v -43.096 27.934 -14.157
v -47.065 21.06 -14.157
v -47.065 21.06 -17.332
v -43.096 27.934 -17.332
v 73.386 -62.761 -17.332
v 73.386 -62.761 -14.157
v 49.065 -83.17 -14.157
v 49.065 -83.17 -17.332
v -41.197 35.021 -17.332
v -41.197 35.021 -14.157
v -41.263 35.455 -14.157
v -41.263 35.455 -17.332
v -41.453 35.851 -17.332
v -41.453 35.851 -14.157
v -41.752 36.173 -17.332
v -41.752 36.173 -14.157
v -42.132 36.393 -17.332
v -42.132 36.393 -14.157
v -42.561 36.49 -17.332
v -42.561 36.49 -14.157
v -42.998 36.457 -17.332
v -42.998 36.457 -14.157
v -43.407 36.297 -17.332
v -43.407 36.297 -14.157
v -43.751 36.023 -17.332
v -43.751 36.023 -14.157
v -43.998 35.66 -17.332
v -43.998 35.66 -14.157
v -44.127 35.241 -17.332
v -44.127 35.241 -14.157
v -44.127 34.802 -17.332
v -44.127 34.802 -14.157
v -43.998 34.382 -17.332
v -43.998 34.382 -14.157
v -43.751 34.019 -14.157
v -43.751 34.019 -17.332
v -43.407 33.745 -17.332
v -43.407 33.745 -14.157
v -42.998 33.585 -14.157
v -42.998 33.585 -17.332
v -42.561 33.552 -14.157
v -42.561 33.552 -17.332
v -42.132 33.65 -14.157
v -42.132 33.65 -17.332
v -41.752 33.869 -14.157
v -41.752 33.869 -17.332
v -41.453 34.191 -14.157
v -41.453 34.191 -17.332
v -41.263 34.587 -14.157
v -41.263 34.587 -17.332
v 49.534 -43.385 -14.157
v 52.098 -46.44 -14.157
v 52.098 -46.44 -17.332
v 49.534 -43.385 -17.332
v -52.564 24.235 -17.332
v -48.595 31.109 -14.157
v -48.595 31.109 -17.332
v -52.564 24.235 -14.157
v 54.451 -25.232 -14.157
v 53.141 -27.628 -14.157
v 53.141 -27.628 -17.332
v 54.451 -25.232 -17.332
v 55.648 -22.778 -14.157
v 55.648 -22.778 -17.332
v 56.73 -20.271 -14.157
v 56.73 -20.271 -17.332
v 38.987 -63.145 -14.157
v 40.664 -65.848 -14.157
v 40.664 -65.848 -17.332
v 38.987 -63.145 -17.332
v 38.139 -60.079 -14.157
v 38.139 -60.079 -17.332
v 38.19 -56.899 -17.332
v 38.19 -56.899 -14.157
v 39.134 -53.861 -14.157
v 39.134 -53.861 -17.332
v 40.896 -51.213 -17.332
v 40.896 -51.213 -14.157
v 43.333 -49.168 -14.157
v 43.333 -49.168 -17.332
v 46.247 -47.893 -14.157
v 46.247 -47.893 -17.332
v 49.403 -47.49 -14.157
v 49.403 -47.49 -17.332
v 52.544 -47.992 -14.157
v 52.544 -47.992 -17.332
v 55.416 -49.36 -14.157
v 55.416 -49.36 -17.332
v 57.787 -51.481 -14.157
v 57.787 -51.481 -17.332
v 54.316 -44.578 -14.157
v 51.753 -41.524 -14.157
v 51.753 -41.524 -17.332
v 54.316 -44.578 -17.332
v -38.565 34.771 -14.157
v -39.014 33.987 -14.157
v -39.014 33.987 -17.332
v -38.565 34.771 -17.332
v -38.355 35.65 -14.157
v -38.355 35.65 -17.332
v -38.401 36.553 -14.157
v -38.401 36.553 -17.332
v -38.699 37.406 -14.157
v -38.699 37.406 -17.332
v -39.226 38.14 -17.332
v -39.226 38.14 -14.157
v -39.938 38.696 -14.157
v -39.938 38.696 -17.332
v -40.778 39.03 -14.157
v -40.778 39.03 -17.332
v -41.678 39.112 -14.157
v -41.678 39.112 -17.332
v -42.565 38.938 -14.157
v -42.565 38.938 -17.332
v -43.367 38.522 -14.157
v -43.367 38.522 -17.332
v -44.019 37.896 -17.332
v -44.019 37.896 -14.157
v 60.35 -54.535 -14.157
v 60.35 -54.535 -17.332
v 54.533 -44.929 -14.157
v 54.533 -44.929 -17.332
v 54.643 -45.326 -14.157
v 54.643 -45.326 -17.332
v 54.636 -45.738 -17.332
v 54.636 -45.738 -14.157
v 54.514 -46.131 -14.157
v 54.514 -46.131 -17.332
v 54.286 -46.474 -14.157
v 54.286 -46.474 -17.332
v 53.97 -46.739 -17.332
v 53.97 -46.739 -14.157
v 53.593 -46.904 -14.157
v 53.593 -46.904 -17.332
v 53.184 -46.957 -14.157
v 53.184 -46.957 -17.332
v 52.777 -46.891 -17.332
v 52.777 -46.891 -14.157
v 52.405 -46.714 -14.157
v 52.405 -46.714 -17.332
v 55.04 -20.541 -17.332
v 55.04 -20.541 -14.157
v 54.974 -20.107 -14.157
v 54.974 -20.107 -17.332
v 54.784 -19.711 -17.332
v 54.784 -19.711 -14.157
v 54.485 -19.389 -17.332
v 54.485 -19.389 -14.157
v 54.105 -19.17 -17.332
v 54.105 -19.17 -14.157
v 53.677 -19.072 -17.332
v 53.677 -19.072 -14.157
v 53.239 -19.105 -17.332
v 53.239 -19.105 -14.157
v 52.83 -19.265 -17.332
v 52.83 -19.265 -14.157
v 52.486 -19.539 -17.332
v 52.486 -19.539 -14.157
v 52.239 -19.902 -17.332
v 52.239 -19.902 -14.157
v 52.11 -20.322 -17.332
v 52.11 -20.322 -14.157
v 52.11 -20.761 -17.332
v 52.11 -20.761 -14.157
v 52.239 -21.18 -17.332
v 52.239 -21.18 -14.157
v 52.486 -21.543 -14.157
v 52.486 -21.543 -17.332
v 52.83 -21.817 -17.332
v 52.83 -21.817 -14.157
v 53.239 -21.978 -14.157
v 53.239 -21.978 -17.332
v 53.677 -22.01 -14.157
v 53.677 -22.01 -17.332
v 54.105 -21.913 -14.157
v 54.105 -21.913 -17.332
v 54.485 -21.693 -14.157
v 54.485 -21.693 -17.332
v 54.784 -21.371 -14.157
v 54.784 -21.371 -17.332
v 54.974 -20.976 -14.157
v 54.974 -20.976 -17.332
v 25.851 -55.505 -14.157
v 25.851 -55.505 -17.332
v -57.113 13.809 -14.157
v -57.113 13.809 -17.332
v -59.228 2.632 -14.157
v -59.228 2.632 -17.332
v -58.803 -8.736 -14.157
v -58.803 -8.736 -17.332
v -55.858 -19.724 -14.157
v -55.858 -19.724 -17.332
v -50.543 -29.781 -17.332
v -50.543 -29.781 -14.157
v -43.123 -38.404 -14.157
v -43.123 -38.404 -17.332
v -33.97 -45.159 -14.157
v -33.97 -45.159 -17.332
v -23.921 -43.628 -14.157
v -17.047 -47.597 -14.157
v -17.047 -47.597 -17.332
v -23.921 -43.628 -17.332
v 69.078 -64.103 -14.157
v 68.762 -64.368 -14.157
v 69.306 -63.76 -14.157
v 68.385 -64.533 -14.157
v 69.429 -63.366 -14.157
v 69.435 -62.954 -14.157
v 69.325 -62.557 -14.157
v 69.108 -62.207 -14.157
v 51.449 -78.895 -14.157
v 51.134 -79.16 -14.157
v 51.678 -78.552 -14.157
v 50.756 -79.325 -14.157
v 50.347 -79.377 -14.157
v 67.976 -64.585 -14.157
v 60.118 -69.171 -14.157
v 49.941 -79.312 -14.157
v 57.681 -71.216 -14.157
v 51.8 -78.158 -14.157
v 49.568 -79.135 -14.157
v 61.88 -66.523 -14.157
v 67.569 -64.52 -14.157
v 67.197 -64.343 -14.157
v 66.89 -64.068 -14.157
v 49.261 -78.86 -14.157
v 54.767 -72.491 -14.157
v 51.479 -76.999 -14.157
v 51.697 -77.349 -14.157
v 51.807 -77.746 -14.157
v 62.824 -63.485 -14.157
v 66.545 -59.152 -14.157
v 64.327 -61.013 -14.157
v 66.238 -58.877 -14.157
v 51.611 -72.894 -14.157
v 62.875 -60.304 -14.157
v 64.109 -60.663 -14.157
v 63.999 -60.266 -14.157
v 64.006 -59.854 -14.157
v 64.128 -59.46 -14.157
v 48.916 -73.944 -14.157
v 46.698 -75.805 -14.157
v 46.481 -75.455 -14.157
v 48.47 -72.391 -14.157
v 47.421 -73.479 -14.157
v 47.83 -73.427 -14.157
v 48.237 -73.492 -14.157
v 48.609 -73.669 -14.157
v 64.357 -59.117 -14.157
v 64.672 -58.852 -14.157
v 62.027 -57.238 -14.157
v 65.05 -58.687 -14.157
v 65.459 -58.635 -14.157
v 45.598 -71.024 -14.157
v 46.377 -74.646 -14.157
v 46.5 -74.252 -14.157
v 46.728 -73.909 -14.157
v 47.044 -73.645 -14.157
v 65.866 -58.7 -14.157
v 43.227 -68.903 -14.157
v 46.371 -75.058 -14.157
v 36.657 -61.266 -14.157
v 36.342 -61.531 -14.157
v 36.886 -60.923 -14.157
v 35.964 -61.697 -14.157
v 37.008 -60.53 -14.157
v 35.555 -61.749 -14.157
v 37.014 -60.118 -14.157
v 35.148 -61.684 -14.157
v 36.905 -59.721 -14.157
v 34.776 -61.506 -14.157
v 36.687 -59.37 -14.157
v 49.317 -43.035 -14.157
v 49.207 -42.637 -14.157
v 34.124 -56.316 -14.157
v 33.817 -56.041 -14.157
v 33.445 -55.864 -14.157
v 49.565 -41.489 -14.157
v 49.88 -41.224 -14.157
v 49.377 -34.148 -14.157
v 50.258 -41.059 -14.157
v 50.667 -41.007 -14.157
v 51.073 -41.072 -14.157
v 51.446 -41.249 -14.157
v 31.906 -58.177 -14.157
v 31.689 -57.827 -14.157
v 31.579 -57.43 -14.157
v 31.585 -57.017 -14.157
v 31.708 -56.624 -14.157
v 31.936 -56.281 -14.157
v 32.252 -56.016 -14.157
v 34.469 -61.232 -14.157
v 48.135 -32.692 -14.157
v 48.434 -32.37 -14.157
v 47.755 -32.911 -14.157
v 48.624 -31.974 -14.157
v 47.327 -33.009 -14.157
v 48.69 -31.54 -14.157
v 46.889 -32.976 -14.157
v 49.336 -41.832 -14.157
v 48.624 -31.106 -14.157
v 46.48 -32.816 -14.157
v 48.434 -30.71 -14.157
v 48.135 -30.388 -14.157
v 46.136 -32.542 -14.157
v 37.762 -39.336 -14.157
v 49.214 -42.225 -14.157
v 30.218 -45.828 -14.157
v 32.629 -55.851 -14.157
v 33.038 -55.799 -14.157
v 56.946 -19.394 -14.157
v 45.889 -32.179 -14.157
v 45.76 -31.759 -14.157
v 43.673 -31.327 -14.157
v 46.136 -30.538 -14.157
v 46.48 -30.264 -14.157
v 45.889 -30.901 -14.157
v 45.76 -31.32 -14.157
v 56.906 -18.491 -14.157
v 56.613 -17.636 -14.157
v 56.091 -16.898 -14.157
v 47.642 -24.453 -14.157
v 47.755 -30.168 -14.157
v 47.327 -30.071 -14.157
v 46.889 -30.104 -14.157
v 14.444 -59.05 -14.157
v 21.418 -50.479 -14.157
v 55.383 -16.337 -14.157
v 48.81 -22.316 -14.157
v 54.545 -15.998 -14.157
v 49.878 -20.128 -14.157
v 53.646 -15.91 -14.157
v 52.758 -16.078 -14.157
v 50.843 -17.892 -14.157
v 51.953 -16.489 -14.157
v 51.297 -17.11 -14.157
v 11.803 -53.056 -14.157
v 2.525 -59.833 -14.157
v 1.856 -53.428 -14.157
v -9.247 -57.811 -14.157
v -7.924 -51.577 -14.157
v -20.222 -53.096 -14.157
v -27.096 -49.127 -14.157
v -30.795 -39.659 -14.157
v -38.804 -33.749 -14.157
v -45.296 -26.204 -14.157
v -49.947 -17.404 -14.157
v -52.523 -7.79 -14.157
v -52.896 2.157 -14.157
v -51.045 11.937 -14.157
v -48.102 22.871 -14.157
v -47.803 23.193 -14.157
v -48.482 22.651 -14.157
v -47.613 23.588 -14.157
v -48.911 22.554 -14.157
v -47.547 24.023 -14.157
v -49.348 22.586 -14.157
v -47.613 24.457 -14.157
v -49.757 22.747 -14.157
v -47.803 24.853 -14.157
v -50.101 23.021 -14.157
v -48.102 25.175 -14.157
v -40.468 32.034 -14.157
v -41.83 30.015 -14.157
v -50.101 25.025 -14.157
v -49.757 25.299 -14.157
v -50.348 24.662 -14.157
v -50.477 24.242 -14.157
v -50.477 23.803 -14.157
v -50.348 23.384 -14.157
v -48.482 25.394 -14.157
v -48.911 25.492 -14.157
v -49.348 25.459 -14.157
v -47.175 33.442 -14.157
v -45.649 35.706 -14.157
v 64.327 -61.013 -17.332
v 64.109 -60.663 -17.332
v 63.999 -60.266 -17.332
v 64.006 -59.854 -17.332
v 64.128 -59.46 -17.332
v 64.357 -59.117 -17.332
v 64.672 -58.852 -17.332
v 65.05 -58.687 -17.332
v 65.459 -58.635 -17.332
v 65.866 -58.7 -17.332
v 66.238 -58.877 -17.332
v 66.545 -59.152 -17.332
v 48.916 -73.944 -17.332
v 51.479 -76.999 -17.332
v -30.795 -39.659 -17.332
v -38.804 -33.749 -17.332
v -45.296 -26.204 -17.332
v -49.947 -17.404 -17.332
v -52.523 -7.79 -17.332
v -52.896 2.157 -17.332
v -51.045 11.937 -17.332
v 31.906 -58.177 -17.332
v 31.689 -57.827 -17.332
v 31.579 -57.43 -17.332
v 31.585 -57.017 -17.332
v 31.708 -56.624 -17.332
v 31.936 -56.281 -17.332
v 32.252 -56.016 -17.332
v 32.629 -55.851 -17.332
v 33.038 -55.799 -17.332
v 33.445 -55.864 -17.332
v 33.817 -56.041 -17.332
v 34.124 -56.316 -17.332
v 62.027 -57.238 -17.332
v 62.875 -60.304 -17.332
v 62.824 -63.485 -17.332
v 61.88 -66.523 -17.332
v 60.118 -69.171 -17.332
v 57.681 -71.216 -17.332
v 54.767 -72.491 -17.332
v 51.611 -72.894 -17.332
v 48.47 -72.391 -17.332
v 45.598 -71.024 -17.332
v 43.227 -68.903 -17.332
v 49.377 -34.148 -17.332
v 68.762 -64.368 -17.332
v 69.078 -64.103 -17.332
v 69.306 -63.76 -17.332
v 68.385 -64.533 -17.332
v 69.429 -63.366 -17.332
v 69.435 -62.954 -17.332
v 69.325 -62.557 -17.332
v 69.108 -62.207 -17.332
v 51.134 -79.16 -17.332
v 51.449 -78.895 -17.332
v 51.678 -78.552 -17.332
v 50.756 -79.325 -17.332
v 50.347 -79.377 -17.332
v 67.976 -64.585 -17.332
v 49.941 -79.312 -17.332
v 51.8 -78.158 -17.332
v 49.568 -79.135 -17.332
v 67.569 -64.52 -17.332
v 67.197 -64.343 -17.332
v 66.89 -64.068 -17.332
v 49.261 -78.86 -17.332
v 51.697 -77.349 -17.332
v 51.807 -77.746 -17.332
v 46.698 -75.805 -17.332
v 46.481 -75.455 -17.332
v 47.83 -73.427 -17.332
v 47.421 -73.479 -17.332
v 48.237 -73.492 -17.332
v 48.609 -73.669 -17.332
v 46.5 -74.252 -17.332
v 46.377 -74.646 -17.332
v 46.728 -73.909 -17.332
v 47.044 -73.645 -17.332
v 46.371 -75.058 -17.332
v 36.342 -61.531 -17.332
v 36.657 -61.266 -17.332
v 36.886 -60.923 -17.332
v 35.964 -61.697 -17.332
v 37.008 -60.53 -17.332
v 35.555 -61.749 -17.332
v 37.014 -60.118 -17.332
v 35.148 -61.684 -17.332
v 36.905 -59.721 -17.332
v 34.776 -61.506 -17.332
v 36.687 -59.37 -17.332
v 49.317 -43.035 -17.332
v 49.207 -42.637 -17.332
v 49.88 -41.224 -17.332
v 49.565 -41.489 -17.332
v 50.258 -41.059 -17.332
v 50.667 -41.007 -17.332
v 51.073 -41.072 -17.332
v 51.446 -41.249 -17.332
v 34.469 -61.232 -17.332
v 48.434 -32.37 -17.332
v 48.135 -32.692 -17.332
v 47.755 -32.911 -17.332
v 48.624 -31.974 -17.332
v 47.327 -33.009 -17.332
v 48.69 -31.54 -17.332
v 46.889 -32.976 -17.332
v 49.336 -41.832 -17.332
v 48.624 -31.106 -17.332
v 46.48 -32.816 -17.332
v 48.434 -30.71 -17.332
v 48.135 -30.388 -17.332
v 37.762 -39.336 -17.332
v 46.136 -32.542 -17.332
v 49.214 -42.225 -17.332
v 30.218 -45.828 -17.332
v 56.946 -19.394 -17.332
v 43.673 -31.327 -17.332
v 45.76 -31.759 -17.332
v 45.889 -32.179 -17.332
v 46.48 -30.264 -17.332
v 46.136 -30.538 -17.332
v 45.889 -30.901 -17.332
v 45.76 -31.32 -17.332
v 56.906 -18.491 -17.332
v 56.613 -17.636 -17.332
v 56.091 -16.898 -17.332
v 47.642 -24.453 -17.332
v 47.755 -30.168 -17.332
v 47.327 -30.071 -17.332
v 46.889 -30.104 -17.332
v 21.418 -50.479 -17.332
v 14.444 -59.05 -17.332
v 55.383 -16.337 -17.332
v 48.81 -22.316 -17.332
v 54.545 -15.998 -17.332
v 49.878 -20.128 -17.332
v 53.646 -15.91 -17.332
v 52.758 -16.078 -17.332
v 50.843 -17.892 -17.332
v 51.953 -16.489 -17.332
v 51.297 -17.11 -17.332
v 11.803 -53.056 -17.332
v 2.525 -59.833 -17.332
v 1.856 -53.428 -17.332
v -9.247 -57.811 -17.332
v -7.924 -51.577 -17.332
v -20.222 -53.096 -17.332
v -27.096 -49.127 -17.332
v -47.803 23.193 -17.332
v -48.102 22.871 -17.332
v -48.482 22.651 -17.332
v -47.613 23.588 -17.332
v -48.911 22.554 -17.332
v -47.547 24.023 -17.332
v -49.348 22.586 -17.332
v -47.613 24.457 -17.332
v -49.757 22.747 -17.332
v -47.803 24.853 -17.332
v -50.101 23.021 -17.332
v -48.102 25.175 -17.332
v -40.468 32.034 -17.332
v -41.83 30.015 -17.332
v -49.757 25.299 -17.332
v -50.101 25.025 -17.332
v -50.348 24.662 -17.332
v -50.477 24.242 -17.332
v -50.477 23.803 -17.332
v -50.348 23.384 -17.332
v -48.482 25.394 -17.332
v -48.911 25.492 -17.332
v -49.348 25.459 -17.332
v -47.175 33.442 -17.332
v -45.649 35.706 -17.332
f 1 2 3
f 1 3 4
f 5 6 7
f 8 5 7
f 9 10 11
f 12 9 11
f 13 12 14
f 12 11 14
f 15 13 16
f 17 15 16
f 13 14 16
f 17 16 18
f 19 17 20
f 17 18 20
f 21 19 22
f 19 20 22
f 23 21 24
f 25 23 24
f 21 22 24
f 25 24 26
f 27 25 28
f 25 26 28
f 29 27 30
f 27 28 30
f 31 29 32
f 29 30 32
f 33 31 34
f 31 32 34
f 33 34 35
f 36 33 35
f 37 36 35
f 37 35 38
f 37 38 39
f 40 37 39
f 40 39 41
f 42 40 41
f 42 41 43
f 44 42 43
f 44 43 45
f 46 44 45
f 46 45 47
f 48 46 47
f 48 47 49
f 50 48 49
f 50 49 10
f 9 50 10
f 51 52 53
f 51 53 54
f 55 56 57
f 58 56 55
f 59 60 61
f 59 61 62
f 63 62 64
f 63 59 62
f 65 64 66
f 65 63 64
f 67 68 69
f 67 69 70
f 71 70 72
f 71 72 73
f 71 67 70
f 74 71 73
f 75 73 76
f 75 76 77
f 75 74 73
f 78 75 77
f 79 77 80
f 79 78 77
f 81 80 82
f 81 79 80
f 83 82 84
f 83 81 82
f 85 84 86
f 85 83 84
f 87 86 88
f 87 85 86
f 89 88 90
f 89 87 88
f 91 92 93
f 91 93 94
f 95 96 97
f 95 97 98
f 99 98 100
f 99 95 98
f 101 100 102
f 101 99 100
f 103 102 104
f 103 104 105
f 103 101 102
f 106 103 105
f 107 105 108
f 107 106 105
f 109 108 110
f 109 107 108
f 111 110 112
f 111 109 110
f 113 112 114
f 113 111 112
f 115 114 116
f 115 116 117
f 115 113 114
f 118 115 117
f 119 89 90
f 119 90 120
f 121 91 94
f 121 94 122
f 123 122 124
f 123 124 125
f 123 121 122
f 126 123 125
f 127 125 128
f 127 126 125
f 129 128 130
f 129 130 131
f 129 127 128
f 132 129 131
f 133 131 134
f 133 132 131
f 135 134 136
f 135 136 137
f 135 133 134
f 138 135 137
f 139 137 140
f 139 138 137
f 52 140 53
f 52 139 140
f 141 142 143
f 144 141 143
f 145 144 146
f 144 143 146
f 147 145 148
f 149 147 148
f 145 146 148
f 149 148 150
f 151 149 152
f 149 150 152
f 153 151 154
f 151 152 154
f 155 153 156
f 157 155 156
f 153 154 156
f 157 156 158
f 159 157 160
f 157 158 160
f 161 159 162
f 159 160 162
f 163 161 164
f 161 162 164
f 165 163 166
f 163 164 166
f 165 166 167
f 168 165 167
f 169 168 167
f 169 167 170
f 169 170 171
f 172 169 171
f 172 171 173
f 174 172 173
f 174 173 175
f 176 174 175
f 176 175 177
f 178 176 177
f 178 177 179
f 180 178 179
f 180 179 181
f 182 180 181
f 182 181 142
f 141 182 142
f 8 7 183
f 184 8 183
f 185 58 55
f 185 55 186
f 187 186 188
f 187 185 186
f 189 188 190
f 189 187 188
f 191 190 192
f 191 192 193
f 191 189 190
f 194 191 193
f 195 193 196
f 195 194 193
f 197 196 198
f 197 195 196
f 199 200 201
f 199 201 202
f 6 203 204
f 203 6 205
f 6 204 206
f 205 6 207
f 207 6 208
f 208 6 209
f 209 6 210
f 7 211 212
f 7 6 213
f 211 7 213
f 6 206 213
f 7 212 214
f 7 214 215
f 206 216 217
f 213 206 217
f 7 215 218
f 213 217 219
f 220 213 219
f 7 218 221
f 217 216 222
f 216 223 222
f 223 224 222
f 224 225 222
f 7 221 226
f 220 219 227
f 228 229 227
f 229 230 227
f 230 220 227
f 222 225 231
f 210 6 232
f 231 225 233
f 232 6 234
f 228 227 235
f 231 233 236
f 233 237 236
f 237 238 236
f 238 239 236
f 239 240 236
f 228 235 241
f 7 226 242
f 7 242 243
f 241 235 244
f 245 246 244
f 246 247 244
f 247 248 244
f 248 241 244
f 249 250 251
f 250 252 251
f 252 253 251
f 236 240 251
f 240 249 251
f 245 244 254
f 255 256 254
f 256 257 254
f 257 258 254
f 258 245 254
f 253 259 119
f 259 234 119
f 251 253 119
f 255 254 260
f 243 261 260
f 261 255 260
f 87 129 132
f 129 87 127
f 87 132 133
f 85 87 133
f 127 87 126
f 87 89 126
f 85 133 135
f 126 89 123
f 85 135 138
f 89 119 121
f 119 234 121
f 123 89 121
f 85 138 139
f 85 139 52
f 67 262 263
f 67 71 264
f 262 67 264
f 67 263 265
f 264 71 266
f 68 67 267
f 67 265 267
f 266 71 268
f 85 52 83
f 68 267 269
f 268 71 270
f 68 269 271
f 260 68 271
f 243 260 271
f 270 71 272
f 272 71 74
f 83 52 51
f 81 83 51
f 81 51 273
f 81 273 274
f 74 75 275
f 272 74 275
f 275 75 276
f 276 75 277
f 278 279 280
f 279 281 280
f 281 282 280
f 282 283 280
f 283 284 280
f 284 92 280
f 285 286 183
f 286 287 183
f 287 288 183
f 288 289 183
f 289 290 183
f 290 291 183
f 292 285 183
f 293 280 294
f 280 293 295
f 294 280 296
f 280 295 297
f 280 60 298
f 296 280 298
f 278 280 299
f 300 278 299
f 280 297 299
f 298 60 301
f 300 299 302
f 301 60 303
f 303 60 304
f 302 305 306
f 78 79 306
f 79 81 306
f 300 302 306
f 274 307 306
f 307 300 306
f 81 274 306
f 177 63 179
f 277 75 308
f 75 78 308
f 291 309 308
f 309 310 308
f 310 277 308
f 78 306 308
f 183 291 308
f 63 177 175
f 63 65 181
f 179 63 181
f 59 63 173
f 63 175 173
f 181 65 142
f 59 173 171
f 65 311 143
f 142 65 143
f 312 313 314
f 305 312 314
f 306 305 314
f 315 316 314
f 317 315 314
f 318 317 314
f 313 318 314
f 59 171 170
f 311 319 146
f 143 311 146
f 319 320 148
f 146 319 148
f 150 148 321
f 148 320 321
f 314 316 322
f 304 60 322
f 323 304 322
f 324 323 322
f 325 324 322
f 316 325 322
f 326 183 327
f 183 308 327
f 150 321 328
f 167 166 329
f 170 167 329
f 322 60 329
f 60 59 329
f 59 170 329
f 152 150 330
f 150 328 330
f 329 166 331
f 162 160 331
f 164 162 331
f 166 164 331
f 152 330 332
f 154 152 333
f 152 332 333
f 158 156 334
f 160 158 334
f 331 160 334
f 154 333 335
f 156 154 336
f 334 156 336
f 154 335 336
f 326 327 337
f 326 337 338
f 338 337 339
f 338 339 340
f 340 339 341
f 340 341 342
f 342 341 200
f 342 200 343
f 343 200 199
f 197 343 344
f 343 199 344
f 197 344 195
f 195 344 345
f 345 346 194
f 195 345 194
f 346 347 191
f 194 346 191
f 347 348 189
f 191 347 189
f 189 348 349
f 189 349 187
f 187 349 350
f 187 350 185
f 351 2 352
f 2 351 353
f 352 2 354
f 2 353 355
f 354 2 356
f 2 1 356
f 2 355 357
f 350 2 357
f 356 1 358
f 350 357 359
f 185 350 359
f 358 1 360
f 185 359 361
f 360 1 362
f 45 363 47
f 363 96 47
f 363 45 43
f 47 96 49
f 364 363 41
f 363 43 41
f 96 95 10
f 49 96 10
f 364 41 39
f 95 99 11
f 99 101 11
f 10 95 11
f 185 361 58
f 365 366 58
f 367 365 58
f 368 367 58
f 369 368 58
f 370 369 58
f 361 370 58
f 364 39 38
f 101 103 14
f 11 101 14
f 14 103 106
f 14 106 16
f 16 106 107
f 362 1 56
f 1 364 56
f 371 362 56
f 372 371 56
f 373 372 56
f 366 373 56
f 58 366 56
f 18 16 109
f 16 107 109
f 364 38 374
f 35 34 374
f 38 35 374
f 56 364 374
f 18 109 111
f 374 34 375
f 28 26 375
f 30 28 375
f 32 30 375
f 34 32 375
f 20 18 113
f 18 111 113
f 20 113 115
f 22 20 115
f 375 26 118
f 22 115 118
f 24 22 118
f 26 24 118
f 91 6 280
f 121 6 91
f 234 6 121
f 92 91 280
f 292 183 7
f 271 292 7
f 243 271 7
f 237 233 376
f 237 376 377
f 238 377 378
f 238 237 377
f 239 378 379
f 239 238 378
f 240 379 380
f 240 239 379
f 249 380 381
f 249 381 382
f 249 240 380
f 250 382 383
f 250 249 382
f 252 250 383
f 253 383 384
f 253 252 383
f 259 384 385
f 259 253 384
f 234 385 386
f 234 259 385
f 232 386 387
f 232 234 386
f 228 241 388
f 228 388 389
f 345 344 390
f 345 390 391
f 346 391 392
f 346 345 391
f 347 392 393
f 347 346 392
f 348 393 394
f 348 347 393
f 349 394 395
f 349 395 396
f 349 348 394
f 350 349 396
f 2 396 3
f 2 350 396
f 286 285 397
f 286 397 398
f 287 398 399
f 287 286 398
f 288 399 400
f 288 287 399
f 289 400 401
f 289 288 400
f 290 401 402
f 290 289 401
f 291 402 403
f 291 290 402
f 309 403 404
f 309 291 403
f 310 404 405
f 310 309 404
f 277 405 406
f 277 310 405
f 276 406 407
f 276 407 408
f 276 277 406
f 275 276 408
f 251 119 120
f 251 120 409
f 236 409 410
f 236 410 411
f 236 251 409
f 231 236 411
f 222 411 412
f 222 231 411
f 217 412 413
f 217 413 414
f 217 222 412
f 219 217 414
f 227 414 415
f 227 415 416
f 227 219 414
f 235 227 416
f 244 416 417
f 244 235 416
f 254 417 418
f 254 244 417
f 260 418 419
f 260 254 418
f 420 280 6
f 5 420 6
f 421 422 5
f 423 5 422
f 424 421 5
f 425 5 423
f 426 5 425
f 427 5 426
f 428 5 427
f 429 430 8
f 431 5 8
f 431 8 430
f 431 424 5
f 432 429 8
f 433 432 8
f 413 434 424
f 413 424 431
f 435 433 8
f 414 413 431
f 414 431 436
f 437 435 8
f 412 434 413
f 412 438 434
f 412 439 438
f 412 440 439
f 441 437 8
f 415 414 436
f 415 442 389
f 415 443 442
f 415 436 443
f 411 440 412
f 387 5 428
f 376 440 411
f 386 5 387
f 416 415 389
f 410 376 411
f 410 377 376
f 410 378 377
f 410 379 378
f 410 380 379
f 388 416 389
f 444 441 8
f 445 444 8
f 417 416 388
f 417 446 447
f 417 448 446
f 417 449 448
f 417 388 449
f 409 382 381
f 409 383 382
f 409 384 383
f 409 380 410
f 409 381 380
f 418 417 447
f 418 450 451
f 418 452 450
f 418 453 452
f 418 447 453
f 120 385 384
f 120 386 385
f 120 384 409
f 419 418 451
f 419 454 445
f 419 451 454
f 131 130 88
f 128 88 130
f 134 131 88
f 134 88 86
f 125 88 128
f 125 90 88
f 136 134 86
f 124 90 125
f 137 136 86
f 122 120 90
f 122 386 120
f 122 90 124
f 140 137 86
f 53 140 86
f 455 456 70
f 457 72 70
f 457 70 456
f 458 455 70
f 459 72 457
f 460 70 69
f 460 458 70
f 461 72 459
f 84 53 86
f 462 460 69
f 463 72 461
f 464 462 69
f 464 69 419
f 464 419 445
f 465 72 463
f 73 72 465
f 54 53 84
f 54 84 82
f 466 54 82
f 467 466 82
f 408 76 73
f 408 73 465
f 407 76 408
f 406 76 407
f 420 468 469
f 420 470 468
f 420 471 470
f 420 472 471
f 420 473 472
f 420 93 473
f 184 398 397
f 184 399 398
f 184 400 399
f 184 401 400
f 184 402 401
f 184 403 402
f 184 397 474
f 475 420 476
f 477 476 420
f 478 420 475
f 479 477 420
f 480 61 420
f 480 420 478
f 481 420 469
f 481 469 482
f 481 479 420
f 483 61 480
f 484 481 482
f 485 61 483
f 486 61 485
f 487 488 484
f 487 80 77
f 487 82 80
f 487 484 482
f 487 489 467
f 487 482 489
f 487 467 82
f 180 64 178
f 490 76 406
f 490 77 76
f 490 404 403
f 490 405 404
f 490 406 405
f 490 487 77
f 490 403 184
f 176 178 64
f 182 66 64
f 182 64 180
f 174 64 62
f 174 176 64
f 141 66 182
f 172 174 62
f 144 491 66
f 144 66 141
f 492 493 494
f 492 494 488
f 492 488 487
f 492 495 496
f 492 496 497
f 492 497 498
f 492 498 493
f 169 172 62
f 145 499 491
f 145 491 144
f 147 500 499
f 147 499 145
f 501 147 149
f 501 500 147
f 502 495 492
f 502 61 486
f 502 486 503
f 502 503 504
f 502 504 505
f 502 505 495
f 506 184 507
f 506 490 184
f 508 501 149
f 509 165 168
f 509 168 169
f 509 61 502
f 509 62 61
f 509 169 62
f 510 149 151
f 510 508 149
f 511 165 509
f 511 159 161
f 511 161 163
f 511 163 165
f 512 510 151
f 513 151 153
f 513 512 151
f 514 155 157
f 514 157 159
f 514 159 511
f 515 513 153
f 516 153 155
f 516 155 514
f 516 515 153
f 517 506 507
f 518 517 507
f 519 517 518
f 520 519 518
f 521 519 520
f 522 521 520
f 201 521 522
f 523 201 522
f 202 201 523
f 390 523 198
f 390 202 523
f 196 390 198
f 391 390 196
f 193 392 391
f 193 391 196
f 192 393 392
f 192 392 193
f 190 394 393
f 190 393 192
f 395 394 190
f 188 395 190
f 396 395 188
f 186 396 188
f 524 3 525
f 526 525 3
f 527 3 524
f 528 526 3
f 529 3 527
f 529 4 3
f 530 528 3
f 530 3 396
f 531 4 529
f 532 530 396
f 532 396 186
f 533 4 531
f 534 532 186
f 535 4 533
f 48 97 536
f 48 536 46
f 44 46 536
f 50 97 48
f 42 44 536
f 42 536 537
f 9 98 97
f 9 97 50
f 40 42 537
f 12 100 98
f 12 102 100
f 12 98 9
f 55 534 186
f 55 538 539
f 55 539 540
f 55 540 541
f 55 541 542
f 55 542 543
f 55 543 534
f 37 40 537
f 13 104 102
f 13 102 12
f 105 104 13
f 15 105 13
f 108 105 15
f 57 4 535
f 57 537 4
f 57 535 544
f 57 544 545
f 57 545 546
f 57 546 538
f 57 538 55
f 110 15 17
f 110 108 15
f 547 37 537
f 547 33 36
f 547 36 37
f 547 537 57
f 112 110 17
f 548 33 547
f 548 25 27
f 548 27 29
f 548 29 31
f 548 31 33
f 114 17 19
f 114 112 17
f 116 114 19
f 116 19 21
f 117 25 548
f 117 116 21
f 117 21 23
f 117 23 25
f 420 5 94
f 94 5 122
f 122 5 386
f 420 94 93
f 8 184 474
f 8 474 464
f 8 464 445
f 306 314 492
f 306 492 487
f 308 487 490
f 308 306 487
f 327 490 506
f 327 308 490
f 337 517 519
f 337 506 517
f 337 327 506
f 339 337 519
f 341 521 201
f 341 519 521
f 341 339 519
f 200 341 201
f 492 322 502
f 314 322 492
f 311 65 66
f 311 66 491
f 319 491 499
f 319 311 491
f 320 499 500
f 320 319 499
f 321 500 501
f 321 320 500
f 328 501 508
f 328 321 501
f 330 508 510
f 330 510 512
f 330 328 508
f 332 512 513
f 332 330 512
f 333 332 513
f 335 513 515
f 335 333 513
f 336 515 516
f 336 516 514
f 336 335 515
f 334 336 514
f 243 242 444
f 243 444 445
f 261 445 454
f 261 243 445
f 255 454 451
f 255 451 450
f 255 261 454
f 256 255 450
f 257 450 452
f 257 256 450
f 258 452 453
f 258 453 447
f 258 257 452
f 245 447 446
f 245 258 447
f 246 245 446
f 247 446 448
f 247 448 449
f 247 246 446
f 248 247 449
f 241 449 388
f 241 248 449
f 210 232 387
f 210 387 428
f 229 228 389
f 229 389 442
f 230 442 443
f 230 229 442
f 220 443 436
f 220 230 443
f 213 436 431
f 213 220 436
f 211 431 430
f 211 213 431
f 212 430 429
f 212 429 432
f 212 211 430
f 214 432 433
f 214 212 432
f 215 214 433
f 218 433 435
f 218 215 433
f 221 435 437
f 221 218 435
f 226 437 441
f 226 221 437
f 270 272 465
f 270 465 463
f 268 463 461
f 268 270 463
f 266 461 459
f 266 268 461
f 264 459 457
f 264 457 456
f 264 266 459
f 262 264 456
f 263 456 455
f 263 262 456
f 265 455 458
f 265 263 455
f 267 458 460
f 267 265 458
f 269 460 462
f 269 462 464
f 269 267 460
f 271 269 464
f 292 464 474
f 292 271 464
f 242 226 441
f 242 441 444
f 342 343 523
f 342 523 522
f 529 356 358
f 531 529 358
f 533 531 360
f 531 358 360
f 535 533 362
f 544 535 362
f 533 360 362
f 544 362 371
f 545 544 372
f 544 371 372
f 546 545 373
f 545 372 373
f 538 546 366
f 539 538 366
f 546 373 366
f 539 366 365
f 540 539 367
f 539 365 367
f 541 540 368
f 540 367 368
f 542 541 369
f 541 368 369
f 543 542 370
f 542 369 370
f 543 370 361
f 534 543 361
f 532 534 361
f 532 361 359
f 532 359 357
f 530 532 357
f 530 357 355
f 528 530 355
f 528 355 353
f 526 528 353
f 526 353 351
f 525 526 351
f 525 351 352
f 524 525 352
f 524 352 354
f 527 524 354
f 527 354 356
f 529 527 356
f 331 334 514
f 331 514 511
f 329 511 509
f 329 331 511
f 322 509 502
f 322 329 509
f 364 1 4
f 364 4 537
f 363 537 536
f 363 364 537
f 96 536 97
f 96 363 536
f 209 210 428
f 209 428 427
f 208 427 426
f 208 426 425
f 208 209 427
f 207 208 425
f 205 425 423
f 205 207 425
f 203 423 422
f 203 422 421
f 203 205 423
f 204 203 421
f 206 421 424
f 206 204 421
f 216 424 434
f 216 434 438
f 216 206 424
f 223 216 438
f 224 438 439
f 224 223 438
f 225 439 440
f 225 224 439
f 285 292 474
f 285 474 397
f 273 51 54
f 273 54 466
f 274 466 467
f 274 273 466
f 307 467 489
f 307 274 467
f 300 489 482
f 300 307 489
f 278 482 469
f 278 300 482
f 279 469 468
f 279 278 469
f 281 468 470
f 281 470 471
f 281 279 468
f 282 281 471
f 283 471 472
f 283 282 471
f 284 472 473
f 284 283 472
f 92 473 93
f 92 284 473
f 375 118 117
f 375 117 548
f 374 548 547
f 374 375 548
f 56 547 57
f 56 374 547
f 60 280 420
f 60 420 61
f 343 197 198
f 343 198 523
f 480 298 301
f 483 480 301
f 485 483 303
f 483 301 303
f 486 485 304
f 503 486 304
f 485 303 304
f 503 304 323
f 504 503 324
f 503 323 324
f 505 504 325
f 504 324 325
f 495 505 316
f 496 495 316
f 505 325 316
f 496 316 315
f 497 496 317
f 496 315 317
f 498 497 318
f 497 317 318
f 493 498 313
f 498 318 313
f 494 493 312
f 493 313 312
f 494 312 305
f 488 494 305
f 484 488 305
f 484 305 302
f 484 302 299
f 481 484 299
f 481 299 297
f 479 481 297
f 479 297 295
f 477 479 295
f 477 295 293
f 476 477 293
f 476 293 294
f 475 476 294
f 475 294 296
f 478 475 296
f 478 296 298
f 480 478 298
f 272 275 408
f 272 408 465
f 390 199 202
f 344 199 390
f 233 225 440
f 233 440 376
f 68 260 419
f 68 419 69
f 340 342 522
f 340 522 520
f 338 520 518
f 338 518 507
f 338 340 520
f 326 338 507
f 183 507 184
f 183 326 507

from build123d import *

# Parameters (mm, degrees)
BOSS_EXTRUDE1_DEPTH   = 3.175
BOSS_EXTRUDE2_DEPTH   = 3.175
F_4_CLEARANCE_HOLE1_D = 2.9464


with BuildPart() as part:
    # Sketch1 → Boss-Extrude1 (new body)
    with BuildSketch(Plane(origin=(0, 0, -14.15699402), x_dir=(-1, 0, 0), z_dir=(0, 0, -1))):
        with BuildLine():
            Line((-49.172312317, -34.502108483), (-53.141062317, -27.628031841))
            ThreePointArc((-53.141062317, -27.628031841), (-55.063803638, -24.012221257), (-56.72992661, -20.271224785))
            ThreePointArc((-56.72992661, -20.271224785), (-54.976138042, -16.13776671), (-50.842679967, -17.891555277))
            ThreePointArc((-50.842679967, -17.891555277), (-49.356678398, -21.228119699), (-47.641801003, -24.453031841))
            Line((-47.641801003, -24.453031841), (-43.673051003, -31.327108483))
            ThreePointArc((-43.673051003, -31.327108483), (-16.68272836, -52.037511462), (17.046778195, -47.596937682))
            Line((17.046778195, -47.596937682), (23.920854837, -43.628187682))
            Line((23.920854837, -43.628187682), (30.79493148, -39.659437682))
            ThreePointArc((30.79493148, -39.659437682), (51.505334458, -12.669115038), (47.064760678, 21.060391517))
            Line((47.064760678, 21.060391517), (43.096010678, 27.934468159))
            ThreePointArc((43.096010678, 27.934468159), (41.160593535, 31.032051618), (39.01404477, 33.987248938))
            ThreePointArc((39.01404477, 33.987248938), (39.561948355, 38.44382292), (44.018522337, 37.895919335))
            ThreePointArc((44.018522337, 37.895919335), (46.425258832, 34.58251628), (48.595271992, 31.109468159))
            Line((48.595271992, 31.109468159), (52.564021992, 24.235391517))
            ThreePointArc((52.564021992, 24.235391517), (57.638963455, -14.312615975), (33.96993148, -45.158698996))
            Line((33.96993148, -45.158698996), (27.095854837, -49.127448996))
            Line((27.095854837, -49.127448996), (20.221778195, -53.096198996))
            ThreePointArc((20.221778195, -53.096198996), (-18.326229296, -58.171140459), (-49.172312317, -34.502108483))
        make_face()
    extrude(amount=BOSS_EXTRUDE1_DEPTH)

    # Sketch6 → Boss-Extrude2 (add)
    with BuildSketch(Plane.XY.offset(-14.15699402)):
        Polygon((73.386475357, -62.761479903), (49.064564288, -83.169986511), (23.03238373, -52.146041808), (47.354294799, -31.7375352), align=None)
        with BuildLine():
            Line((57.786630634, -51.480655173), (60.349939064, -54.535487203))
            ThreePointArc((60.349939064, -54.535487203), (58.972420693, -70.280594225), (43.227313671, -68.903075855))
            Line((43.227313671, -68.903075855), (40.664005241, -65.848243824))
            ThreePointArc((40.664005241, -65.848243824), (42.041523612, -50.103136802), (57.786630634, -51.480655173))
        make_face(mode=Mode.SUBTRACT)
        with BuildLine():
            Line((49.261329446, -78.860212796), (46.698021016, -75.805380766))
            ThreePointArc((46.698021016, -75.805380766), (46.876472259, -73.76567372), (48.916179305, -73.944124963))
            Line((48.916179305, -73.944124963), (51.479487735, -76.998956993))
            ThreePointArc((51.479487735, -76.998956993), (51.301036492, -79.03866404), (49.261329446, -78.860212796))
        make_face(mode=Mode.SUBTRACT)
        with BuildLine():
            Line((34.124093716, -56.31560382), (36.687402146, -59.370435851))
            ThreePointArc((36.687402146, -59.370435851), (36.508950903, -61.410142897), (34.469243857, -61.231691653))
            Line((34.469243857, -61.231691653), (31.905935427, -58.176859623))
            ThreePointArc((31.905935427, -58.176859623), (32.08438667, -56.137152577), (34.124093716, -56.31560382))
        make_face(mode=Mode.SUBTRACT)
        with BuildLine():
            Line((51.752614859, -41.523518231), (54.315923289, -44.578350261))
            ThreePointArc((54.315923289, -44.578350261), (54.137472045, -46.618057308), (52.097764999, -46.439606064))
            Line((52.097764999, -46.439606064), (49.534456569, -43.384774034))
            ThreePointArc((49.534456569, -43.384774034), (49.712907813, -41.345066988), (51.752614859, -41.523518231))
        make_face(mode=Mode.SUBTRACT)
        with BuildLine():
            Line((66.544700448, -59.152039374), (69.108008878, -62.206871404))
            ThreePointArc((69.108008878, -62.206871404), (68.929557635, -64.24657845), (66.889850589, -64.068127207))
            Line((66.889850589, -64.068127207), (64.326542159, -61.013295177))
            ThreePointArc((64.326542159, -61.013295177), (64.504993402, -58.973588131), (66.544700448, -59.152039374))
        make_face(mode=Mode.SUBTRACT)
    extrude(amount=-BOSS_EXTRUDE2_DEPTH)

    # #4 Clearance Hole1 (through all)
    with Locations(Plane(origin=(0, 0, -17.33199402), x_dir=(-1, 0, 0), z_dir=(0, 0, -1))):
        with Locations((-53.56643166, -20.541270527), (-47.21643166, -31.539793155), (42.670641335, 35.021229473), (49.020641335, 24.022706845)):
            Hole(F_4_CLEARANCE_HOLE1_D / 2)


solid = part.part
